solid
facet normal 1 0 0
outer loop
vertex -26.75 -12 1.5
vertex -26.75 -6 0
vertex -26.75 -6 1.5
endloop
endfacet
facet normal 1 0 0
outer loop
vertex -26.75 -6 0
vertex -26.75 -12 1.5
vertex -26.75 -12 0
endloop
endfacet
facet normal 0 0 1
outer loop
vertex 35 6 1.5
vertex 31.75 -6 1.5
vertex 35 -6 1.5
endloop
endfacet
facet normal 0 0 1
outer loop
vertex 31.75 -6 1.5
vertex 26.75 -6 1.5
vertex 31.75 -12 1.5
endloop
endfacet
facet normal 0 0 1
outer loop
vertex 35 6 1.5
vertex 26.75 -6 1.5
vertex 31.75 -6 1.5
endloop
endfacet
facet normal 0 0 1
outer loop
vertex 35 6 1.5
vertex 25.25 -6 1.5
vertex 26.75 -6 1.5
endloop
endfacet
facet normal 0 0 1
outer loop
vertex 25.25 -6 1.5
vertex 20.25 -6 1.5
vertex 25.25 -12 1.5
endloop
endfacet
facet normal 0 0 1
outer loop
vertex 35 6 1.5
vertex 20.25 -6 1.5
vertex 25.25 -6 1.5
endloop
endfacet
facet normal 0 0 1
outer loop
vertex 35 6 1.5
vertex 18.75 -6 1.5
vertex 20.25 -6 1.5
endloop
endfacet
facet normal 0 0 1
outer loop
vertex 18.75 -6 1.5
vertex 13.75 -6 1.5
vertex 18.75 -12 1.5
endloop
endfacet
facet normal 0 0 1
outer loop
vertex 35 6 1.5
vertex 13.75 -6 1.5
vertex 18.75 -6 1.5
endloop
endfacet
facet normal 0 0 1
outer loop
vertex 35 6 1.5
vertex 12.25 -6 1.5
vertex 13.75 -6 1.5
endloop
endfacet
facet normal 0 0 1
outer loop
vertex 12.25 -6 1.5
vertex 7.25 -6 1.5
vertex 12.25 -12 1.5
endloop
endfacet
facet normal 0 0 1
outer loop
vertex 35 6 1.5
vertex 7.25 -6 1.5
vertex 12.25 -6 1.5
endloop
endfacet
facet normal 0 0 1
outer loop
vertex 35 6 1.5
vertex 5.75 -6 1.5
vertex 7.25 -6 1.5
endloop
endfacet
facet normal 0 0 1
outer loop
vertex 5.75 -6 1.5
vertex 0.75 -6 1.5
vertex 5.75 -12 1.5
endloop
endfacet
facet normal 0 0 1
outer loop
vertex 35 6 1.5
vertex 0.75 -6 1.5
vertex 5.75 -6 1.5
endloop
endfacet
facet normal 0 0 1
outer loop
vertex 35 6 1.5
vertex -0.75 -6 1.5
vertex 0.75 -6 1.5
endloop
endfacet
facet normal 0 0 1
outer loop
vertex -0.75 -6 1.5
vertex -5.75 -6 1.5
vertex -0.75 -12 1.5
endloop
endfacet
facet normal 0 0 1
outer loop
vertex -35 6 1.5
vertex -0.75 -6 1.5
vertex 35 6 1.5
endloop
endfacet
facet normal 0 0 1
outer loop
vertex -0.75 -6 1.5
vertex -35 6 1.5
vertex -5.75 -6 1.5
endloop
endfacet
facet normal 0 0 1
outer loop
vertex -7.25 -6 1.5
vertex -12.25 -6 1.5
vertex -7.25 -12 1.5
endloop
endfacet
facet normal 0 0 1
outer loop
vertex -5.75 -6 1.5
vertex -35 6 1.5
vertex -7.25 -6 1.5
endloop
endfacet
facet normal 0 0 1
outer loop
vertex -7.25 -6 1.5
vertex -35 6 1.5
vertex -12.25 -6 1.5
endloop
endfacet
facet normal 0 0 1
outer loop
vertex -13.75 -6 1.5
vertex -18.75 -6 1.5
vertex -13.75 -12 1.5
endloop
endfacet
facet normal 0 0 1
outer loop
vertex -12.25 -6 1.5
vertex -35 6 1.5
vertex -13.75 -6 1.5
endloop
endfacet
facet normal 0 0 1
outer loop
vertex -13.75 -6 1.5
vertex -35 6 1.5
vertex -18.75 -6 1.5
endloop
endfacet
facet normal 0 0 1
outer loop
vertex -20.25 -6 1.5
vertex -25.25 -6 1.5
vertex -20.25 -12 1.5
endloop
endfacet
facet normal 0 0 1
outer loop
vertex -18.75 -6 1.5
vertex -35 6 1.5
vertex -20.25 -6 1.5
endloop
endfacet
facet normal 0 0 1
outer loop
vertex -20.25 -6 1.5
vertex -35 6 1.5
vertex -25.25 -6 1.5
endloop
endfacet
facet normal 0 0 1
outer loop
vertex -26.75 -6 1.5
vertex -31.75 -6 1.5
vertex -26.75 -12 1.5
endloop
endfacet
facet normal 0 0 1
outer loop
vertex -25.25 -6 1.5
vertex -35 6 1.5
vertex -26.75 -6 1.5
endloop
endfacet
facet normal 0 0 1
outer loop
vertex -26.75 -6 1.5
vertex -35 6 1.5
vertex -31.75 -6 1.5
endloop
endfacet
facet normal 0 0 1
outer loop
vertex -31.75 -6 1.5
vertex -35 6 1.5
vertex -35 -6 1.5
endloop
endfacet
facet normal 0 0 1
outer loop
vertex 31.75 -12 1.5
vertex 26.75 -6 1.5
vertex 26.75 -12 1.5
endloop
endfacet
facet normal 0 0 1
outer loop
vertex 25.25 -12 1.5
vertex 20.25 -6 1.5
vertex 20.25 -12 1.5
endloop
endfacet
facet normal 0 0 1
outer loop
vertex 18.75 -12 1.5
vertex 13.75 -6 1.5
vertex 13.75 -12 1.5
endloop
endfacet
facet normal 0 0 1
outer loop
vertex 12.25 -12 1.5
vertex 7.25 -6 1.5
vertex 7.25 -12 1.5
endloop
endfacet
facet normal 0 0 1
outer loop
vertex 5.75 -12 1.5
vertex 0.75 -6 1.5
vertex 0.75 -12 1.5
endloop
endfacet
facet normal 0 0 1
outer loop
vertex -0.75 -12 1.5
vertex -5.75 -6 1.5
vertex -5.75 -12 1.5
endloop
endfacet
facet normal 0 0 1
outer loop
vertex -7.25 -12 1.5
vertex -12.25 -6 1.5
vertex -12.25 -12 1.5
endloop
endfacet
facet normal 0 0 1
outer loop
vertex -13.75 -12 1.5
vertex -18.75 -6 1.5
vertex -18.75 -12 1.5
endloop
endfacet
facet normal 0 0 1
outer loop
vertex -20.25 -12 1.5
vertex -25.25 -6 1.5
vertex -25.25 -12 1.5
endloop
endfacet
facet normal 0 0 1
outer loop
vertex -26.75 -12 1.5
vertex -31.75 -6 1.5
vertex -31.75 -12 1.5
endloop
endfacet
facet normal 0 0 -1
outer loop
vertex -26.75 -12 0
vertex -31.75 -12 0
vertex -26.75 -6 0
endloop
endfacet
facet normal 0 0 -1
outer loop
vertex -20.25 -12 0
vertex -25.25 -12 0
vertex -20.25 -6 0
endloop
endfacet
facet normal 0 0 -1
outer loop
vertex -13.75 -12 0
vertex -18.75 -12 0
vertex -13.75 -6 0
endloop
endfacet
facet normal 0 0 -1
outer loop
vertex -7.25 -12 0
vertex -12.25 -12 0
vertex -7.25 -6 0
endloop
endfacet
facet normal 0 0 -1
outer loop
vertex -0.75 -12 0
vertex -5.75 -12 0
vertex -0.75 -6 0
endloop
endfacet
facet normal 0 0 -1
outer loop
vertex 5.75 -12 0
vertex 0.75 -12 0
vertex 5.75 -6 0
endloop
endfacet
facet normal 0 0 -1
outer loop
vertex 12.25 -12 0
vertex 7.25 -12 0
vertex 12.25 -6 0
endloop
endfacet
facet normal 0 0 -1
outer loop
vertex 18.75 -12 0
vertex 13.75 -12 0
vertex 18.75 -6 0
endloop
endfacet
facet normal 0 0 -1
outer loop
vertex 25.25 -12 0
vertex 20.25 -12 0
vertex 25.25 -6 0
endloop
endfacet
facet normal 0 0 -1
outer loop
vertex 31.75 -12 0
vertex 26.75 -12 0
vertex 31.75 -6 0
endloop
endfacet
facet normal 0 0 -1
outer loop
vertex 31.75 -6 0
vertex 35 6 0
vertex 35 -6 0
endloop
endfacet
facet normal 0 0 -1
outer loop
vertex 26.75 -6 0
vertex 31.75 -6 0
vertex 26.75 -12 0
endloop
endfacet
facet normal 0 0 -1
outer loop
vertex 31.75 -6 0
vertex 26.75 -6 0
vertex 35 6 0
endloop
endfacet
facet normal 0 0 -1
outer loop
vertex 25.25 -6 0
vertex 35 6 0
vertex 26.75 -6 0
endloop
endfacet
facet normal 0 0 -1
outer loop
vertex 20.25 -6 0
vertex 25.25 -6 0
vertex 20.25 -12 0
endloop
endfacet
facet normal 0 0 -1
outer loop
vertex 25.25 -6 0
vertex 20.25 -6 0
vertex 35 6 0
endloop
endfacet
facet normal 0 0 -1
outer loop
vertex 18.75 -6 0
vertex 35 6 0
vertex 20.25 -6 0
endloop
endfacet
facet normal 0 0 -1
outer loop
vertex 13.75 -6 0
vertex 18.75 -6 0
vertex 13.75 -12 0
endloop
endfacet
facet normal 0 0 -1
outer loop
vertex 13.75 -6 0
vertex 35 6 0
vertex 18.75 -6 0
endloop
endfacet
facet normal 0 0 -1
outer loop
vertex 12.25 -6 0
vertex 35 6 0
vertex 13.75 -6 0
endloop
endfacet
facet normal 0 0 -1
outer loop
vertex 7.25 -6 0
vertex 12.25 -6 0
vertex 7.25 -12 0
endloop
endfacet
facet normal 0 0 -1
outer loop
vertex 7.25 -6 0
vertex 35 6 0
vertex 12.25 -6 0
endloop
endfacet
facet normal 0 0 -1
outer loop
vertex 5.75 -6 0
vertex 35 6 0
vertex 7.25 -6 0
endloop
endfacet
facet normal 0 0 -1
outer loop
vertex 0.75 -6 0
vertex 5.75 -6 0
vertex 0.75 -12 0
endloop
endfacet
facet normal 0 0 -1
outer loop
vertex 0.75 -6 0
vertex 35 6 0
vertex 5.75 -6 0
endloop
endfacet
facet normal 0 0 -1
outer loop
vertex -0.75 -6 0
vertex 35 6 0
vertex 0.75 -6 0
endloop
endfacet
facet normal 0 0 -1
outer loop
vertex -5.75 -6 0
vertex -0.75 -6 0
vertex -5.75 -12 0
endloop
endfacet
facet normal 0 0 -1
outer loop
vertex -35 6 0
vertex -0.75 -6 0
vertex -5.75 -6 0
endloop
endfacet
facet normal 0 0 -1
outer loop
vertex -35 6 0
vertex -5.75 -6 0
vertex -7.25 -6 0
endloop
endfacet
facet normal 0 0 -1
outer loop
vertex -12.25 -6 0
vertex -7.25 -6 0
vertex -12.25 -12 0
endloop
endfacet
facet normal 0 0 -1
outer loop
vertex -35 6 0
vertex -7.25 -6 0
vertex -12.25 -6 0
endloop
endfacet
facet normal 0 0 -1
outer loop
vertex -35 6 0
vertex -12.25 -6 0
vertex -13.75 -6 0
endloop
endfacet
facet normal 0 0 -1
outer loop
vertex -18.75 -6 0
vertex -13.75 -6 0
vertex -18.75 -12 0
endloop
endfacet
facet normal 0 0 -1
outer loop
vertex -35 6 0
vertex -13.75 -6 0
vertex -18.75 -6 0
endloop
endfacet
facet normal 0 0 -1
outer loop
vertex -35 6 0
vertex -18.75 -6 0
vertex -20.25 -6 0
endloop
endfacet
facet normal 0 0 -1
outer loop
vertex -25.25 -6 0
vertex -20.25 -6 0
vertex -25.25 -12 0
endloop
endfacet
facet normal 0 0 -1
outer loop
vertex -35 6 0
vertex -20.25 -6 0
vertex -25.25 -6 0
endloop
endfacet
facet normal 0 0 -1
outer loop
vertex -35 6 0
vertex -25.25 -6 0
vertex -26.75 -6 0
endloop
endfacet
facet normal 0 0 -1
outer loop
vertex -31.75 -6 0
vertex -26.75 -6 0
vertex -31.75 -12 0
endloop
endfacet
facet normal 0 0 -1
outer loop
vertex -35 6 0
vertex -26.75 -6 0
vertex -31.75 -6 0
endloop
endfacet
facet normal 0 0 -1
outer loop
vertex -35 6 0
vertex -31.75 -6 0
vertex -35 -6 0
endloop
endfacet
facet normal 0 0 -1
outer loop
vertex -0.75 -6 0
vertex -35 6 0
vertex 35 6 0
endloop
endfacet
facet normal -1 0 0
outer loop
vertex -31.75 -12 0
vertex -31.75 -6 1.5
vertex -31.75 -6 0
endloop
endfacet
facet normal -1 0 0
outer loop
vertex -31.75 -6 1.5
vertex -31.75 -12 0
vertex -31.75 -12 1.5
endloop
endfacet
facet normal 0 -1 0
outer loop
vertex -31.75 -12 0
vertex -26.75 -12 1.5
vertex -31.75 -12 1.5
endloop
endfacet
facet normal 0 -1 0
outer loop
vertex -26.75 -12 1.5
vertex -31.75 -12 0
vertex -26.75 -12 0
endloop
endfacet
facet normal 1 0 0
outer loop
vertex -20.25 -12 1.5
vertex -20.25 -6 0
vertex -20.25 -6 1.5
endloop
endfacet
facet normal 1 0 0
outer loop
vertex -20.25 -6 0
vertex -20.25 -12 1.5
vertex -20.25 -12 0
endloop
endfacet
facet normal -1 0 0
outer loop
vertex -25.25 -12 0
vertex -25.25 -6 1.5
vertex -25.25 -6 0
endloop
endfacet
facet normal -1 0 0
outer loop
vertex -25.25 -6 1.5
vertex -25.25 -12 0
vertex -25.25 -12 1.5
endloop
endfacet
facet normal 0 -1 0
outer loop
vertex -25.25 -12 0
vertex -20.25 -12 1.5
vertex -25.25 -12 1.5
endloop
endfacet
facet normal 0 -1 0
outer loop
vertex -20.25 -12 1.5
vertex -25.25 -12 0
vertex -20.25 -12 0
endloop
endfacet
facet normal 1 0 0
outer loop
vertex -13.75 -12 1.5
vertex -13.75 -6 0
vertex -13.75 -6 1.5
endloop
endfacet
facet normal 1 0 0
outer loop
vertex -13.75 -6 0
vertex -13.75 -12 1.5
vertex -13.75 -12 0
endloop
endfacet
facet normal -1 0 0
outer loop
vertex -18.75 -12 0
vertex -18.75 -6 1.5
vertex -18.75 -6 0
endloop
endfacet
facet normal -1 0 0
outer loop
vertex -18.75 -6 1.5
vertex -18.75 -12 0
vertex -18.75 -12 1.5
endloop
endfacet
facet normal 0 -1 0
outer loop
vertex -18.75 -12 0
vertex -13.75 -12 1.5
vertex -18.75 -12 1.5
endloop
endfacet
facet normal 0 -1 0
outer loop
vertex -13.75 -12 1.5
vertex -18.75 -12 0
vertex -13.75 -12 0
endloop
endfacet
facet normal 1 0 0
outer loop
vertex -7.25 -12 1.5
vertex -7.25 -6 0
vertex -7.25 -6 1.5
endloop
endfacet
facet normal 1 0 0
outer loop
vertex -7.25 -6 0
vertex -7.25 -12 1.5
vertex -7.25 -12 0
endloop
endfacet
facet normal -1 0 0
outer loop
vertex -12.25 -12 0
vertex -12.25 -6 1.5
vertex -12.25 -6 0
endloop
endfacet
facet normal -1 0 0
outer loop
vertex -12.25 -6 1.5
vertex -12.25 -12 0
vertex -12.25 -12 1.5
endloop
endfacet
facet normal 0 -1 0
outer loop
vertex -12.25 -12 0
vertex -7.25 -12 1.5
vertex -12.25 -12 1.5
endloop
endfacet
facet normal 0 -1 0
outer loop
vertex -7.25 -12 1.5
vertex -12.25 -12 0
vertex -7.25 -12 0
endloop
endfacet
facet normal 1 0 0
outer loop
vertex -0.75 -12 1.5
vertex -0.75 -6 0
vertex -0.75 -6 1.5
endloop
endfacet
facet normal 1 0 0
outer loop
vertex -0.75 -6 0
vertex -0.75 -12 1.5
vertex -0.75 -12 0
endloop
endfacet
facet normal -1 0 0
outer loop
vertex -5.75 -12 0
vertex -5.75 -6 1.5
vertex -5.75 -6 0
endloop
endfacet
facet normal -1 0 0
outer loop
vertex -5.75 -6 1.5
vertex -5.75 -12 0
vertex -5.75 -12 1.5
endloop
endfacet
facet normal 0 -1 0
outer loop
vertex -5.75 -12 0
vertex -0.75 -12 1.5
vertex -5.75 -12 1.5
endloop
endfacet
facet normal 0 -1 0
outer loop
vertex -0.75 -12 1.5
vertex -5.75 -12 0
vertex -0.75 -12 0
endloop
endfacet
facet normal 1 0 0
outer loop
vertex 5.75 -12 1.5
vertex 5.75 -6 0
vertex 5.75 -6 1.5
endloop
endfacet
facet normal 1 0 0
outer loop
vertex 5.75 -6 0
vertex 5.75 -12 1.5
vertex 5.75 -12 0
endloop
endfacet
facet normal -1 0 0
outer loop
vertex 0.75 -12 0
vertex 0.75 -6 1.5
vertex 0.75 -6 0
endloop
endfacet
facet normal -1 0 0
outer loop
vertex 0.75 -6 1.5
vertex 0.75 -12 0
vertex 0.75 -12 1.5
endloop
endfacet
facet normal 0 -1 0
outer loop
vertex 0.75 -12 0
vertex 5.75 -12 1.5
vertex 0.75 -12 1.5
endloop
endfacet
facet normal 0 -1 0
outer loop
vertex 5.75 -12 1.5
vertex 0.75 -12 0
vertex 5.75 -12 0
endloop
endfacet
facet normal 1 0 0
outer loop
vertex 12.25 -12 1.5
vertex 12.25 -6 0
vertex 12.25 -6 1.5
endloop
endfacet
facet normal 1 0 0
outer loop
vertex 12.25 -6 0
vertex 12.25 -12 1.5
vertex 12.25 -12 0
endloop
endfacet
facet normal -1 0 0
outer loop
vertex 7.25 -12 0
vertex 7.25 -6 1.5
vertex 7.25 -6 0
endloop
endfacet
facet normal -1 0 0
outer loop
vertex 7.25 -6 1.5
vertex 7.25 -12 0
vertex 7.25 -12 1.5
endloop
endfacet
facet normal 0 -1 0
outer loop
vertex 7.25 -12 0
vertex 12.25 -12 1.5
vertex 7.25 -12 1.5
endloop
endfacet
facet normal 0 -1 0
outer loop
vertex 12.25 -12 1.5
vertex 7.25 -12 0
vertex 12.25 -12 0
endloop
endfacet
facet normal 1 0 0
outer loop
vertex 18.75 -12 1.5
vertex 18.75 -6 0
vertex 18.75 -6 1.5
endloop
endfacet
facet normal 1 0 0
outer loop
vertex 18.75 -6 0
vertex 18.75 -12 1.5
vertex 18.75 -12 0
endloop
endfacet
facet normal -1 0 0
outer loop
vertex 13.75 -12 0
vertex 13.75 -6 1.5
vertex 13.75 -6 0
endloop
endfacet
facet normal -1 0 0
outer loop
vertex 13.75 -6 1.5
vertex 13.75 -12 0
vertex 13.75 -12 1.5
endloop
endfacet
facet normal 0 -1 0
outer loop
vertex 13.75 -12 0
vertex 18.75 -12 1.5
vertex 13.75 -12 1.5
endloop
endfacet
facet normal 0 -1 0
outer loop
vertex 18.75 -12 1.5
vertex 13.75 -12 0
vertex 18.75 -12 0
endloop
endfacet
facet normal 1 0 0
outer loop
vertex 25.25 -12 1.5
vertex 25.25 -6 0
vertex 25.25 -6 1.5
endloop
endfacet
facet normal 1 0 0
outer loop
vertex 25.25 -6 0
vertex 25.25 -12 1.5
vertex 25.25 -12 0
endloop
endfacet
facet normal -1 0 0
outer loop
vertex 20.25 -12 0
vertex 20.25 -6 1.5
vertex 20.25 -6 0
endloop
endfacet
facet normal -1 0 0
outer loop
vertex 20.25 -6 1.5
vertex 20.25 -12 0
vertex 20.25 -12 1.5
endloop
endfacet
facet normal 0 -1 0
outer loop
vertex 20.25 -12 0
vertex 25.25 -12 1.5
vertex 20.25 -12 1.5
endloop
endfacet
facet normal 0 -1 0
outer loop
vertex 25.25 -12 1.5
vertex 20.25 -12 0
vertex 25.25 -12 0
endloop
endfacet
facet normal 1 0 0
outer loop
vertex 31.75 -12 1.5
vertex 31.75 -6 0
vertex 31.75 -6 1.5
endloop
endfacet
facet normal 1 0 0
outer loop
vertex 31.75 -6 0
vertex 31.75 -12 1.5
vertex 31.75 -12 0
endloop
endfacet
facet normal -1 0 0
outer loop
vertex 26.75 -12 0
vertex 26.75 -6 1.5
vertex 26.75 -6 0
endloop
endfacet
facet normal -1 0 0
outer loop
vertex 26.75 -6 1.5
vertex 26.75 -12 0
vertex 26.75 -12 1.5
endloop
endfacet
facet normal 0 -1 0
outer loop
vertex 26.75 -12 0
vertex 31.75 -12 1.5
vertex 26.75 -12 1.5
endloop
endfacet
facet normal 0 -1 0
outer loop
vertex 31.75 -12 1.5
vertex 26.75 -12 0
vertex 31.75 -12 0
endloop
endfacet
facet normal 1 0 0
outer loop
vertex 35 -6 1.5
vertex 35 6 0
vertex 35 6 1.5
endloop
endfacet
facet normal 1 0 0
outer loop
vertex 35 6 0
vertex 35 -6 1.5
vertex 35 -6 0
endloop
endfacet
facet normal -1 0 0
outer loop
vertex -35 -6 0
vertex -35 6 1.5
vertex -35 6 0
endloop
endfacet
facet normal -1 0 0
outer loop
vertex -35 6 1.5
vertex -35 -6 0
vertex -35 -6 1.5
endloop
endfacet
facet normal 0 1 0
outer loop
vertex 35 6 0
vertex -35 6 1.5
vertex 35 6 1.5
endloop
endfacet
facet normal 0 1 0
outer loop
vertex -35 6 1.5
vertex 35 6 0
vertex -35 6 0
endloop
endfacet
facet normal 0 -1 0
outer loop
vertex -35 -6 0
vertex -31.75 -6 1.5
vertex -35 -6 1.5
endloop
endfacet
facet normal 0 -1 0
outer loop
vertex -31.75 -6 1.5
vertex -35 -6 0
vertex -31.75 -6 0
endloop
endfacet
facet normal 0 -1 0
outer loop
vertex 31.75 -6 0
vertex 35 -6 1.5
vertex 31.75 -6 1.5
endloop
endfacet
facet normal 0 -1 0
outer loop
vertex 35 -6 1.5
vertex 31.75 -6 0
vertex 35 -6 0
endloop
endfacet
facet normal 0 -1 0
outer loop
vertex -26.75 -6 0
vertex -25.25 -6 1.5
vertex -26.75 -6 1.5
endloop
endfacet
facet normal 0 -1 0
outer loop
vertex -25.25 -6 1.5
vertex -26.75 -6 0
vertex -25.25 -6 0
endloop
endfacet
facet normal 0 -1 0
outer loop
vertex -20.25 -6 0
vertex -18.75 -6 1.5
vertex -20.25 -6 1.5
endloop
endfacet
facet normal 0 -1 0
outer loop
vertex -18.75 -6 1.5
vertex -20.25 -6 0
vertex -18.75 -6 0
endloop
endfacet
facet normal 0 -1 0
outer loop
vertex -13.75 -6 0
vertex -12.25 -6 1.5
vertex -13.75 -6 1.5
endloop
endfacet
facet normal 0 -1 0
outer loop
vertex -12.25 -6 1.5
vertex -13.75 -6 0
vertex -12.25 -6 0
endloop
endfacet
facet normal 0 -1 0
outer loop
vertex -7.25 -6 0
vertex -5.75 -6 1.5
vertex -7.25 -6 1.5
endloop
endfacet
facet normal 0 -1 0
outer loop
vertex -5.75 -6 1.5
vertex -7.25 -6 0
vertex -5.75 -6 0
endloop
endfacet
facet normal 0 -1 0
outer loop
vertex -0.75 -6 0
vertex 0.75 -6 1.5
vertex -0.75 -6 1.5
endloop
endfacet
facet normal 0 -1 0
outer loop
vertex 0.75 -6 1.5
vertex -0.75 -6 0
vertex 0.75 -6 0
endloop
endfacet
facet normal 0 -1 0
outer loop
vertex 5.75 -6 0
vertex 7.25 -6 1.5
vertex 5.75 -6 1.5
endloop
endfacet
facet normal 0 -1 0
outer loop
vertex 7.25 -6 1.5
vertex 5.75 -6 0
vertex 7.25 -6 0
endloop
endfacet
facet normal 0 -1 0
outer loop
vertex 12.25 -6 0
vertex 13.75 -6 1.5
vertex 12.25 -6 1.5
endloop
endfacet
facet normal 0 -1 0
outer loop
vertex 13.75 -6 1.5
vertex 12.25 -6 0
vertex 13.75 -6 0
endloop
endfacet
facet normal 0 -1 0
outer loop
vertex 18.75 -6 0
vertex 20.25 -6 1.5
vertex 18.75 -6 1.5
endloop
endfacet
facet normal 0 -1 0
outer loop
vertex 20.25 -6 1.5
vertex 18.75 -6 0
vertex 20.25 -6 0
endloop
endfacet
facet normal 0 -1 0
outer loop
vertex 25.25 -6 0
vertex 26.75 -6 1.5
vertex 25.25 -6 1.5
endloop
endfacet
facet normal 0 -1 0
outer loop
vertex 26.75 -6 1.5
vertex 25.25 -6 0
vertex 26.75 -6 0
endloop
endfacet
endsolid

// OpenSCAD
// 10-well agarose gel comb, printed flat on the bed (Z = thickness)

// --- Dimensions (mm) ---
plate_thick   = 1.5;   // Z thickness of the whole comb
spine_len     = 70.0;  // X length of the back bar
spine_width   = 12.0;  // Y width of the back bar
tooth_w       = 5.0;   // X width of each tooth
tooth_len     = 12.0;  // Y length of each tooth (hangs in -Y from spine)
gap           = 1.5;   // X gap between neighbouring teeth
n_tooth       = 10;    // number of teeth

// --- Derived layout ---
row_width     = n_tooth * tooth_w + (n_tooth - 1) * gap;  // total X span of the tooth row
row_x0        = -row_width / 2.0;                          // left edge of the row (centred on X)
tooth_x0      = row_x0;                                    // X of the left edge of tooth 0
tooth_y0      = -tooth_len;                                // Y of the tip (bottom) of each tooth

$fn = 64;

// --- Model (rests on z = 0, centred on origin in X and Y) ---
union() {
    // Back bar (spine): centred on origin in X and Y
    translate([-spine_len/2, -spine_width/2, 0])
        cube([spine_len, spine_width, plate_thick]);

    // Teeth: hang from the -Y edge of the spine
    for (i = [0 : n_tooth - 1]) {
        tx = tooth_x0 + i * (tooth_w + gap);   // X of left edge of tooth i
        translate([tx, tooth_y0, 0])
            cube([tooth_w, tooth_len, plate_thick]);
    }
}
